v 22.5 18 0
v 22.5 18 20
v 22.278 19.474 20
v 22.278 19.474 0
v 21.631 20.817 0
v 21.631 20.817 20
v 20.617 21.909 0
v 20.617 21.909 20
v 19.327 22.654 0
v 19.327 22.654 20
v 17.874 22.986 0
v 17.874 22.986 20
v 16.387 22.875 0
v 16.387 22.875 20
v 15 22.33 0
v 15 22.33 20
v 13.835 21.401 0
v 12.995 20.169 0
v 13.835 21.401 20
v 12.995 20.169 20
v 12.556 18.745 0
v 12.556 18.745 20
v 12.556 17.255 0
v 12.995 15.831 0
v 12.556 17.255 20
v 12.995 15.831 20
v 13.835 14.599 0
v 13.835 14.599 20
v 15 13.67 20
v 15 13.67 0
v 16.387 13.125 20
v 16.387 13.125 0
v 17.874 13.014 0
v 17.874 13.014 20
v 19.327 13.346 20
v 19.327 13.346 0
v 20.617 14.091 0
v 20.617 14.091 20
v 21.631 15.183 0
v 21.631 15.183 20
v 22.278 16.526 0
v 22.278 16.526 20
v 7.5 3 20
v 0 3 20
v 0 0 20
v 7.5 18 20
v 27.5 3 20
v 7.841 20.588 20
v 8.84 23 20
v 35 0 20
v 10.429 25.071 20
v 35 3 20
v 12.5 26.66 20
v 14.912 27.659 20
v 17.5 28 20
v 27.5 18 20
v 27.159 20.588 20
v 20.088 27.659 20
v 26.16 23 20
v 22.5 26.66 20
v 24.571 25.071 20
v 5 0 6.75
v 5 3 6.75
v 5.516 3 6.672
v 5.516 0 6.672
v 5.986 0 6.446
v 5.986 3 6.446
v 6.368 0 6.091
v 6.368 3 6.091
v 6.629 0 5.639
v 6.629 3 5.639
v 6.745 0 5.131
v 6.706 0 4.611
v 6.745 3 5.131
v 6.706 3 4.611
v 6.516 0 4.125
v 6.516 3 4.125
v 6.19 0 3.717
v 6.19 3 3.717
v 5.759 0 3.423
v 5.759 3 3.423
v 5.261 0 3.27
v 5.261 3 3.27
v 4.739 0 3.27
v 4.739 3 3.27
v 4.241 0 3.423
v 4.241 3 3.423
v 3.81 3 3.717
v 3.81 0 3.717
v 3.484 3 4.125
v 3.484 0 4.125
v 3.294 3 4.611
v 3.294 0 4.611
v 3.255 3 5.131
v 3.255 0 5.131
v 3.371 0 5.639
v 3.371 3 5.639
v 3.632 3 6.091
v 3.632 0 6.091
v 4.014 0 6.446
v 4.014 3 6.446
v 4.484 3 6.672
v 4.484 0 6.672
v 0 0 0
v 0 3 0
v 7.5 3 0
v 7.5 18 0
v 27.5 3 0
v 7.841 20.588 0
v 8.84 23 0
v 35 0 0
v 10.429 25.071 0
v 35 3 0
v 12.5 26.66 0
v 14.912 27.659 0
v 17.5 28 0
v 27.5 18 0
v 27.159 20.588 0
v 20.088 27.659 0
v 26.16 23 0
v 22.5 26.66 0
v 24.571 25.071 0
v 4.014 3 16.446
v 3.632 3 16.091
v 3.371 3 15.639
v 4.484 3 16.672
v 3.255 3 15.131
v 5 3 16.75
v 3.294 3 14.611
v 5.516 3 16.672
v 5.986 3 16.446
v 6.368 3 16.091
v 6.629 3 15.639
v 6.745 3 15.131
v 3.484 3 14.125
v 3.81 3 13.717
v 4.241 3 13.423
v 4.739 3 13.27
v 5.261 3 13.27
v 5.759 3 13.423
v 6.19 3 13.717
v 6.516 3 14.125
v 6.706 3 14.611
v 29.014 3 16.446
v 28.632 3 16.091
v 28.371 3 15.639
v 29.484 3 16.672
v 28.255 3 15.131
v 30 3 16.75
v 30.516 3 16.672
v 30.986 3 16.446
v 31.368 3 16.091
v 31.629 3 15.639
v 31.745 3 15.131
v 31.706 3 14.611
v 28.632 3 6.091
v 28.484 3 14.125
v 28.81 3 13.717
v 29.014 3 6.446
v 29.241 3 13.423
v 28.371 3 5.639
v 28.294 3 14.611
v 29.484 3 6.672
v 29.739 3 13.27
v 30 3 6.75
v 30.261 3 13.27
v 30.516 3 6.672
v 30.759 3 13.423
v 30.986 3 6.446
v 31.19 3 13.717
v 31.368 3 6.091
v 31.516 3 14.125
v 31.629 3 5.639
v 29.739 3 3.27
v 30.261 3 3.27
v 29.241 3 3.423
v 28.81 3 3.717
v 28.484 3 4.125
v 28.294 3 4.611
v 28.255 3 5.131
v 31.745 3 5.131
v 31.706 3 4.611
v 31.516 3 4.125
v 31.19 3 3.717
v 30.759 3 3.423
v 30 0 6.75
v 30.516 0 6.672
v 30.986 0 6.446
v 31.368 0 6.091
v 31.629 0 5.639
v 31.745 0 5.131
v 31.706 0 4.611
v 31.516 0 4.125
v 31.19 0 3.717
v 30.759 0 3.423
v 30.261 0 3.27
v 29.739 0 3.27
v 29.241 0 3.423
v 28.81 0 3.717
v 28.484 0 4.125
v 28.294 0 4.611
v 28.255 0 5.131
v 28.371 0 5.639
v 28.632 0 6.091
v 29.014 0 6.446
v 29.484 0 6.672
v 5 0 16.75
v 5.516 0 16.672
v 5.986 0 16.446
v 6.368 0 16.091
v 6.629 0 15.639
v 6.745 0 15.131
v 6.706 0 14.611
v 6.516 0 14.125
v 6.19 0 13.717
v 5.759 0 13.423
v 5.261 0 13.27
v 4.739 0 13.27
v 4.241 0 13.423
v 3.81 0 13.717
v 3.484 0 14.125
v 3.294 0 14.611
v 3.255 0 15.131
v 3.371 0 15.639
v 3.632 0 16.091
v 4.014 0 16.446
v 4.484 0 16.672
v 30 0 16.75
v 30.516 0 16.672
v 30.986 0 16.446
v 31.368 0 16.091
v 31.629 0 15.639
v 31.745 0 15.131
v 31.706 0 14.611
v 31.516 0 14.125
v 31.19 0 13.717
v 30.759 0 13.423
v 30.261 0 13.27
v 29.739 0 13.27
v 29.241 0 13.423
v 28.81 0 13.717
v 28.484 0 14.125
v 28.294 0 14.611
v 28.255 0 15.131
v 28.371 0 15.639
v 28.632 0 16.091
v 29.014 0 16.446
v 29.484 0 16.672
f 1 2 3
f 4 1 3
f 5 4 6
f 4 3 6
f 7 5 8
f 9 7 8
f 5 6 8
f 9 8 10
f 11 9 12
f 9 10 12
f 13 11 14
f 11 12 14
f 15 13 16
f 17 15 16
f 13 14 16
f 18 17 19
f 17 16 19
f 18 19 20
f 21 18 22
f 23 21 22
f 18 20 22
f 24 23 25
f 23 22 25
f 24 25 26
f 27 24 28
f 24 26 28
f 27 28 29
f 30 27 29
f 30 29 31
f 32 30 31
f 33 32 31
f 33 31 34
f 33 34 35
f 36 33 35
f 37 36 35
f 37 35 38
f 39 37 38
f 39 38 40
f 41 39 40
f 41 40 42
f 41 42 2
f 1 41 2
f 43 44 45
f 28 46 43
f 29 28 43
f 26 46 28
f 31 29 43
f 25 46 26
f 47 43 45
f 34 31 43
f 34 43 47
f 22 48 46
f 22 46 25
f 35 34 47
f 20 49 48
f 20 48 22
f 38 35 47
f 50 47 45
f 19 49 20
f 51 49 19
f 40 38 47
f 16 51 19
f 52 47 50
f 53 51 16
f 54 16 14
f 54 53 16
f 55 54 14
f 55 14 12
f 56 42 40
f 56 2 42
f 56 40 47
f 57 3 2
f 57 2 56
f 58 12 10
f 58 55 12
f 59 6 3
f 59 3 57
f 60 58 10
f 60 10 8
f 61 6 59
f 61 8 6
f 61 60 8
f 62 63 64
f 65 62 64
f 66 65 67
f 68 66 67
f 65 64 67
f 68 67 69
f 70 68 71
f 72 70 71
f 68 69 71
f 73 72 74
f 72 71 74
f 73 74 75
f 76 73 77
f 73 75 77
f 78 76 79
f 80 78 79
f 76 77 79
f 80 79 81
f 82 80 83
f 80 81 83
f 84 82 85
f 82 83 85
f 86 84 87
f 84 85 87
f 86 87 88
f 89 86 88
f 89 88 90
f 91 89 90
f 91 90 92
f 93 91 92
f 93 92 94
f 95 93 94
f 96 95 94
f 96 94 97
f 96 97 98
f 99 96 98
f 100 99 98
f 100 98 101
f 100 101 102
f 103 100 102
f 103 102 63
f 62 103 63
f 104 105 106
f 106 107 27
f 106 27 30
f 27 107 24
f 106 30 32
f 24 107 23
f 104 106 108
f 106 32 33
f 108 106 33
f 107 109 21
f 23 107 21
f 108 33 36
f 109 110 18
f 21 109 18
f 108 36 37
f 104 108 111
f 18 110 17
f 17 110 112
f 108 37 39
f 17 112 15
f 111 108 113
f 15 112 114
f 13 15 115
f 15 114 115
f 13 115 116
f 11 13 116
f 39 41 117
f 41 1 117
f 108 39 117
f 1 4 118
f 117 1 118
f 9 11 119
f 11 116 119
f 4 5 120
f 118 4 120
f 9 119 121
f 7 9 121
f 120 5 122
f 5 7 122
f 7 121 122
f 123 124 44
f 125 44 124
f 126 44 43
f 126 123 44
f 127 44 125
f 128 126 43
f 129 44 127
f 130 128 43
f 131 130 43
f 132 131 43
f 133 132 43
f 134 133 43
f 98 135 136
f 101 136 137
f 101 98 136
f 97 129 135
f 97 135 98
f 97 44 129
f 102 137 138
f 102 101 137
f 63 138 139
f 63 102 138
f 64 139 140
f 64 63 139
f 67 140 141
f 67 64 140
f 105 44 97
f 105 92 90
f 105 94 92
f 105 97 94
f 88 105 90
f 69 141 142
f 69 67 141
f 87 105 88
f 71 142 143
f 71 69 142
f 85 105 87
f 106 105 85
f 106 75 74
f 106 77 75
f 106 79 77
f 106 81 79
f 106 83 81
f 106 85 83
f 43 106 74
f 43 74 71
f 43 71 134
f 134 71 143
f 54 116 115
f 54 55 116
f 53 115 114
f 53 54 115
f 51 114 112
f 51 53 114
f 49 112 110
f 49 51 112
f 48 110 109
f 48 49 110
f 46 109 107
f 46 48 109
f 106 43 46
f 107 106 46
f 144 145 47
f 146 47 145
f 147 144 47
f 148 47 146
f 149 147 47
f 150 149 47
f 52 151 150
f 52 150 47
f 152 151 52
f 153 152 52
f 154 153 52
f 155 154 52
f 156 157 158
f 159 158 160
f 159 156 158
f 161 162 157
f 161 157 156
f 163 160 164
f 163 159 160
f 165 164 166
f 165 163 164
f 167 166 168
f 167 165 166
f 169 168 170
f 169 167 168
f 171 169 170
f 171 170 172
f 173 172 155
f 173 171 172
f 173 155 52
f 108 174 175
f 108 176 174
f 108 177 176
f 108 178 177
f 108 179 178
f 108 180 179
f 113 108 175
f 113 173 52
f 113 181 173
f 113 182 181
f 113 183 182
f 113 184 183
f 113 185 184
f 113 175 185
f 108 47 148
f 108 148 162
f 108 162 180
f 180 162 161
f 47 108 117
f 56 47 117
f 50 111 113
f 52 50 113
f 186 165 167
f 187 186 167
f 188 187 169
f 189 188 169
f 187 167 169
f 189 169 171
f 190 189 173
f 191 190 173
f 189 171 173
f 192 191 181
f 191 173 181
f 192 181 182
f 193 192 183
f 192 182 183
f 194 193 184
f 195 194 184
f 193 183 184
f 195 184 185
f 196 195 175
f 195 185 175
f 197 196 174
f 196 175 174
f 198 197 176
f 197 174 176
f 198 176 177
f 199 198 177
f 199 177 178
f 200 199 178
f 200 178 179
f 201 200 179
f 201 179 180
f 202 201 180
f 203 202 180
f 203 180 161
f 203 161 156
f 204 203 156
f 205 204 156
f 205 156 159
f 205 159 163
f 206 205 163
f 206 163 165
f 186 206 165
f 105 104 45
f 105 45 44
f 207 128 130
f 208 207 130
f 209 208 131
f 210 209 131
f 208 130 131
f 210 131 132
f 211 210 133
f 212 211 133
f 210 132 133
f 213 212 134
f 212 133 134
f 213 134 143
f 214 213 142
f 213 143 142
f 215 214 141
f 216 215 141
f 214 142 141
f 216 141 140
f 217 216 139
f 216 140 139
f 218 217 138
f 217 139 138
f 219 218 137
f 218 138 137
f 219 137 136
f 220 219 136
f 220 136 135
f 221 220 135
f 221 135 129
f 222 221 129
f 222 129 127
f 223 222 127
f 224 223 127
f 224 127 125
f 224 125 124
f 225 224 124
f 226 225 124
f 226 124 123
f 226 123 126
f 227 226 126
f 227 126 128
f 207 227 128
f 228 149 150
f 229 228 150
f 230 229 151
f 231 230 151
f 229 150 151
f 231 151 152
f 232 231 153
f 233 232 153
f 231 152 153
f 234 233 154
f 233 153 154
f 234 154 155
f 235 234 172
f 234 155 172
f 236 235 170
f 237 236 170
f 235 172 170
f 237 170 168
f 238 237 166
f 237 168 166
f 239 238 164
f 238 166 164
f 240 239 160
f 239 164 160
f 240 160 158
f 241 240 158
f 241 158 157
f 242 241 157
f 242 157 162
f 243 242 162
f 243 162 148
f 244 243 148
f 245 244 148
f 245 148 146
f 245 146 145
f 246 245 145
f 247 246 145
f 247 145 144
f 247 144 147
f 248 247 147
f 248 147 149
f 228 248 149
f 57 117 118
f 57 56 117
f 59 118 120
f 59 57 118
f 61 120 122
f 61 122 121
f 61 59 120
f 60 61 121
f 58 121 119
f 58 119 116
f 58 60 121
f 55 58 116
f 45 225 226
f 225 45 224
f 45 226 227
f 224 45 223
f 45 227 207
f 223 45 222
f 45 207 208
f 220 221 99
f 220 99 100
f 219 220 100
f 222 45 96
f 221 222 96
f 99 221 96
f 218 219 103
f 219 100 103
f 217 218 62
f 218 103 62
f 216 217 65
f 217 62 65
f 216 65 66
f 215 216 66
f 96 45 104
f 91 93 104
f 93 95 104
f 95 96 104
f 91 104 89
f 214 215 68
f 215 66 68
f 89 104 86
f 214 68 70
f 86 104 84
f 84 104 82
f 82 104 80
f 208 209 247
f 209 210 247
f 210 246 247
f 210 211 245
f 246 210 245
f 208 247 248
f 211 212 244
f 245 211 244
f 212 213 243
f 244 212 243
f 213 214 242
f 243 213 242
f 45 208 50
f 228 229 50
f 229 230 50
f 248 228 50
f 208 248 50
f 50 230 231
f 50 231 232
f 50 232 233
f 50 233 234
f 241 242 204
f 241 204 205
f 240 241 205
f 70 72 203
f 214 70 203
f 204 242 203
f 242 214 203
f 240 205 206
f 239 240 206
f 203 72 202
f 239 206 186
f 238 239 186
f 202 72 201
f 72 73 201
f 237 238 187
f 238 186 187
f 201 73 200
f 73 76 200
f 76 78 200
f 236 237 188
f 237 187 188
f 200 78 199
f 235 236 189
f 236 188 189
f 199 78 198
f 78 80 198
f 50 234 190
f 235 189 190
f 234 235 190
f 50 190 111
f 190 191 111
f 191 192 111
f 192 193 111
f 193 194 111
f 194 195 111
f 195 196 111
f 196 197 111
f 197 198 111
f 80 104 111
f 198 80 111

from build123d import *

# Parameters (mm, degrees)
SKETCH_1_W          = 35
SKETCH_1_H          = 3
SKETCH_1_W_2        = 20
SKETCH_1_H_2        = 25
EXTRUDE_1_DEPTH     = 20
FILLET_1_R          = 10
FILLET_2_R          = 10
CUT_EXTRUDE_1_REACH = 51.082
SKETCH_2_R          = 5
CUT_EXTRUDE_2_REACH = 49.434
SKETCH_4_R          = 1.75


with BuildPart() as part:
    # 草图1 → 凸台-拉伸1 (new body)
    with BuildSketch(Plane.XY):
        with Locations((17.5, 1.5)):
            Rectangle(SKETCH_1_W, SKETCH_1_H)
        with Locations((17.5, 15.5)):
            Rectangle(SKETCH_1_W_2, SKETCH_1_H_2)
    extrude(amount=EXTRUDE_1_DEPTH)

    # 圆角1
    fillet_1_edges = [part.edges().sort_by_distance(p)[0] for p in [
        (27.5, 28, 10),
    ]]
    fillet(fillet_1_edges, radius=FILLET_1_R)

    # 圆角2
    fillet_2_edges = [part.edges().sort_by_distance(p)[0] for p in [
        (7.5, 28, 10),
    ]]
    fillet(fillet_2_edges, radius=FILLET_2_R - 0.0001)  # a hair under: the kernel refuses the full size

    # 草图2 → 切除-拉伸1 (cut, up to next)
    with BuildSketch(Plane.XY.offset(20), mode=Mode.PRIVATE) as cut_extrude_1_sk1:
        with Locations((17.5, 18)):
            Circle(SKETCH_2_R)
    cut_extrude_1_tool1 = extrude(cut_extrude_1_sk1.sketch, amount=-CUT_EXTRUDE_1_REACH, mode=Mode.PRIVATE) & part.part
    add(cut_extrude_1_tool1.solids().sort_by_distance((17.5, 18, 20))[0], mode=Mode.SUBTRACT)

    # 草图4 → 切除-拉伸2 (cut, up to next)
    with BuildSketch(Plane(origin=(0, 3, 0), x_dir=(1, 0, 0), z_dir=(0, 1, 0)), mode=Mode.PRIVATE) as cut_extrude_2_sk1:
        with Locations(Location((30, -15, 0), (0, 0, 270))):
            Circle(SKETCH_4_R)
    cut_extrude_2_tool1 = extrude(cut_extrude_2_sk1.sketch, amount=-CUT_EXTRUDE_2_REACH, mode=Mode.PRIVATE) & part.part
    # 草图4 → 切除-拉伸2 (cut, up to next)
    with BuildSketch(Plane(origin=(0, 3, 0), x_dir=(1, 0, 0), z_dir=(0, 1, 0)), mode=Mode.PRIVATE) as cut_extrude_2_sk2:
        with Locations(Location((30, -5, 0), (0, 0, 270))):
            Circle(SKETCH_4_R)
    cut_extrude_2_tool2 = extrude(cut_extrude_2_sk2.sketch, amount=-CUT_EXTRUDE_2_REACH, mode=Mode.PRIVATE) & part.part
    # 草图4 → 切除-拉伸2 (cut, up to next)
    with BuildSketch(Plane(origin=(0, 3, 0), x_dir=(1, 0, 0), z_dir=(0, 1, 0)), mode=Mode.PRIVATE) as cut_extrude_2_sk3:
        with Locations(Location((5, -15, 0), (0, 0, 270))):
            Circle(SKETCH_4_R)
    cut_extrude_2_tool3 = extrude(cut_extrude_2_sk3.sketch, amount=-CUT_EXTRUDE_2_REACH, mode=Mode.PRIVATE) & part.part
    # 草图4 → 切除-拉伸2 (cut, up to next)
    with BuildSketch(Plane(origin=(0, 3, 0), x_dir=(1, 0, 0), z_dir=(0, 1, 0)), mode=Mode.PRIVATE) as cut_extrude_2_sk4:
        with Locations(Location((5, -5, 0), (0, 0, 270))):
            Circle(SKETCH_4_R)
    cut_extrude_2_tool4 = extrude(cut_extrude_2_sk4.sketch, amount=-CUT_EXTRUDE_2_REACH, mode=Mode.PRIVATE) & part.part
    add(cut_extrude_2_tool1.solids().sort_by_distance((30, 3, 15))[0], mode=Mode.SUBTRACT)
    add(cut_extrude_2_tool2.solids().sort_by_distance((30, 3, 5))[0], mode=Mode.SUBTRACT)
    add(cut_extrude_2_tool3.solids().sort_by_distance((5, 3, 15))[0], mode=Mode.SUBTRACT)
    add(cut_extrude_2_tool4.solids().sort_by_distance((5, 3, 5))[0], mode=Mode.SUBTRACT)


solid = part.part
